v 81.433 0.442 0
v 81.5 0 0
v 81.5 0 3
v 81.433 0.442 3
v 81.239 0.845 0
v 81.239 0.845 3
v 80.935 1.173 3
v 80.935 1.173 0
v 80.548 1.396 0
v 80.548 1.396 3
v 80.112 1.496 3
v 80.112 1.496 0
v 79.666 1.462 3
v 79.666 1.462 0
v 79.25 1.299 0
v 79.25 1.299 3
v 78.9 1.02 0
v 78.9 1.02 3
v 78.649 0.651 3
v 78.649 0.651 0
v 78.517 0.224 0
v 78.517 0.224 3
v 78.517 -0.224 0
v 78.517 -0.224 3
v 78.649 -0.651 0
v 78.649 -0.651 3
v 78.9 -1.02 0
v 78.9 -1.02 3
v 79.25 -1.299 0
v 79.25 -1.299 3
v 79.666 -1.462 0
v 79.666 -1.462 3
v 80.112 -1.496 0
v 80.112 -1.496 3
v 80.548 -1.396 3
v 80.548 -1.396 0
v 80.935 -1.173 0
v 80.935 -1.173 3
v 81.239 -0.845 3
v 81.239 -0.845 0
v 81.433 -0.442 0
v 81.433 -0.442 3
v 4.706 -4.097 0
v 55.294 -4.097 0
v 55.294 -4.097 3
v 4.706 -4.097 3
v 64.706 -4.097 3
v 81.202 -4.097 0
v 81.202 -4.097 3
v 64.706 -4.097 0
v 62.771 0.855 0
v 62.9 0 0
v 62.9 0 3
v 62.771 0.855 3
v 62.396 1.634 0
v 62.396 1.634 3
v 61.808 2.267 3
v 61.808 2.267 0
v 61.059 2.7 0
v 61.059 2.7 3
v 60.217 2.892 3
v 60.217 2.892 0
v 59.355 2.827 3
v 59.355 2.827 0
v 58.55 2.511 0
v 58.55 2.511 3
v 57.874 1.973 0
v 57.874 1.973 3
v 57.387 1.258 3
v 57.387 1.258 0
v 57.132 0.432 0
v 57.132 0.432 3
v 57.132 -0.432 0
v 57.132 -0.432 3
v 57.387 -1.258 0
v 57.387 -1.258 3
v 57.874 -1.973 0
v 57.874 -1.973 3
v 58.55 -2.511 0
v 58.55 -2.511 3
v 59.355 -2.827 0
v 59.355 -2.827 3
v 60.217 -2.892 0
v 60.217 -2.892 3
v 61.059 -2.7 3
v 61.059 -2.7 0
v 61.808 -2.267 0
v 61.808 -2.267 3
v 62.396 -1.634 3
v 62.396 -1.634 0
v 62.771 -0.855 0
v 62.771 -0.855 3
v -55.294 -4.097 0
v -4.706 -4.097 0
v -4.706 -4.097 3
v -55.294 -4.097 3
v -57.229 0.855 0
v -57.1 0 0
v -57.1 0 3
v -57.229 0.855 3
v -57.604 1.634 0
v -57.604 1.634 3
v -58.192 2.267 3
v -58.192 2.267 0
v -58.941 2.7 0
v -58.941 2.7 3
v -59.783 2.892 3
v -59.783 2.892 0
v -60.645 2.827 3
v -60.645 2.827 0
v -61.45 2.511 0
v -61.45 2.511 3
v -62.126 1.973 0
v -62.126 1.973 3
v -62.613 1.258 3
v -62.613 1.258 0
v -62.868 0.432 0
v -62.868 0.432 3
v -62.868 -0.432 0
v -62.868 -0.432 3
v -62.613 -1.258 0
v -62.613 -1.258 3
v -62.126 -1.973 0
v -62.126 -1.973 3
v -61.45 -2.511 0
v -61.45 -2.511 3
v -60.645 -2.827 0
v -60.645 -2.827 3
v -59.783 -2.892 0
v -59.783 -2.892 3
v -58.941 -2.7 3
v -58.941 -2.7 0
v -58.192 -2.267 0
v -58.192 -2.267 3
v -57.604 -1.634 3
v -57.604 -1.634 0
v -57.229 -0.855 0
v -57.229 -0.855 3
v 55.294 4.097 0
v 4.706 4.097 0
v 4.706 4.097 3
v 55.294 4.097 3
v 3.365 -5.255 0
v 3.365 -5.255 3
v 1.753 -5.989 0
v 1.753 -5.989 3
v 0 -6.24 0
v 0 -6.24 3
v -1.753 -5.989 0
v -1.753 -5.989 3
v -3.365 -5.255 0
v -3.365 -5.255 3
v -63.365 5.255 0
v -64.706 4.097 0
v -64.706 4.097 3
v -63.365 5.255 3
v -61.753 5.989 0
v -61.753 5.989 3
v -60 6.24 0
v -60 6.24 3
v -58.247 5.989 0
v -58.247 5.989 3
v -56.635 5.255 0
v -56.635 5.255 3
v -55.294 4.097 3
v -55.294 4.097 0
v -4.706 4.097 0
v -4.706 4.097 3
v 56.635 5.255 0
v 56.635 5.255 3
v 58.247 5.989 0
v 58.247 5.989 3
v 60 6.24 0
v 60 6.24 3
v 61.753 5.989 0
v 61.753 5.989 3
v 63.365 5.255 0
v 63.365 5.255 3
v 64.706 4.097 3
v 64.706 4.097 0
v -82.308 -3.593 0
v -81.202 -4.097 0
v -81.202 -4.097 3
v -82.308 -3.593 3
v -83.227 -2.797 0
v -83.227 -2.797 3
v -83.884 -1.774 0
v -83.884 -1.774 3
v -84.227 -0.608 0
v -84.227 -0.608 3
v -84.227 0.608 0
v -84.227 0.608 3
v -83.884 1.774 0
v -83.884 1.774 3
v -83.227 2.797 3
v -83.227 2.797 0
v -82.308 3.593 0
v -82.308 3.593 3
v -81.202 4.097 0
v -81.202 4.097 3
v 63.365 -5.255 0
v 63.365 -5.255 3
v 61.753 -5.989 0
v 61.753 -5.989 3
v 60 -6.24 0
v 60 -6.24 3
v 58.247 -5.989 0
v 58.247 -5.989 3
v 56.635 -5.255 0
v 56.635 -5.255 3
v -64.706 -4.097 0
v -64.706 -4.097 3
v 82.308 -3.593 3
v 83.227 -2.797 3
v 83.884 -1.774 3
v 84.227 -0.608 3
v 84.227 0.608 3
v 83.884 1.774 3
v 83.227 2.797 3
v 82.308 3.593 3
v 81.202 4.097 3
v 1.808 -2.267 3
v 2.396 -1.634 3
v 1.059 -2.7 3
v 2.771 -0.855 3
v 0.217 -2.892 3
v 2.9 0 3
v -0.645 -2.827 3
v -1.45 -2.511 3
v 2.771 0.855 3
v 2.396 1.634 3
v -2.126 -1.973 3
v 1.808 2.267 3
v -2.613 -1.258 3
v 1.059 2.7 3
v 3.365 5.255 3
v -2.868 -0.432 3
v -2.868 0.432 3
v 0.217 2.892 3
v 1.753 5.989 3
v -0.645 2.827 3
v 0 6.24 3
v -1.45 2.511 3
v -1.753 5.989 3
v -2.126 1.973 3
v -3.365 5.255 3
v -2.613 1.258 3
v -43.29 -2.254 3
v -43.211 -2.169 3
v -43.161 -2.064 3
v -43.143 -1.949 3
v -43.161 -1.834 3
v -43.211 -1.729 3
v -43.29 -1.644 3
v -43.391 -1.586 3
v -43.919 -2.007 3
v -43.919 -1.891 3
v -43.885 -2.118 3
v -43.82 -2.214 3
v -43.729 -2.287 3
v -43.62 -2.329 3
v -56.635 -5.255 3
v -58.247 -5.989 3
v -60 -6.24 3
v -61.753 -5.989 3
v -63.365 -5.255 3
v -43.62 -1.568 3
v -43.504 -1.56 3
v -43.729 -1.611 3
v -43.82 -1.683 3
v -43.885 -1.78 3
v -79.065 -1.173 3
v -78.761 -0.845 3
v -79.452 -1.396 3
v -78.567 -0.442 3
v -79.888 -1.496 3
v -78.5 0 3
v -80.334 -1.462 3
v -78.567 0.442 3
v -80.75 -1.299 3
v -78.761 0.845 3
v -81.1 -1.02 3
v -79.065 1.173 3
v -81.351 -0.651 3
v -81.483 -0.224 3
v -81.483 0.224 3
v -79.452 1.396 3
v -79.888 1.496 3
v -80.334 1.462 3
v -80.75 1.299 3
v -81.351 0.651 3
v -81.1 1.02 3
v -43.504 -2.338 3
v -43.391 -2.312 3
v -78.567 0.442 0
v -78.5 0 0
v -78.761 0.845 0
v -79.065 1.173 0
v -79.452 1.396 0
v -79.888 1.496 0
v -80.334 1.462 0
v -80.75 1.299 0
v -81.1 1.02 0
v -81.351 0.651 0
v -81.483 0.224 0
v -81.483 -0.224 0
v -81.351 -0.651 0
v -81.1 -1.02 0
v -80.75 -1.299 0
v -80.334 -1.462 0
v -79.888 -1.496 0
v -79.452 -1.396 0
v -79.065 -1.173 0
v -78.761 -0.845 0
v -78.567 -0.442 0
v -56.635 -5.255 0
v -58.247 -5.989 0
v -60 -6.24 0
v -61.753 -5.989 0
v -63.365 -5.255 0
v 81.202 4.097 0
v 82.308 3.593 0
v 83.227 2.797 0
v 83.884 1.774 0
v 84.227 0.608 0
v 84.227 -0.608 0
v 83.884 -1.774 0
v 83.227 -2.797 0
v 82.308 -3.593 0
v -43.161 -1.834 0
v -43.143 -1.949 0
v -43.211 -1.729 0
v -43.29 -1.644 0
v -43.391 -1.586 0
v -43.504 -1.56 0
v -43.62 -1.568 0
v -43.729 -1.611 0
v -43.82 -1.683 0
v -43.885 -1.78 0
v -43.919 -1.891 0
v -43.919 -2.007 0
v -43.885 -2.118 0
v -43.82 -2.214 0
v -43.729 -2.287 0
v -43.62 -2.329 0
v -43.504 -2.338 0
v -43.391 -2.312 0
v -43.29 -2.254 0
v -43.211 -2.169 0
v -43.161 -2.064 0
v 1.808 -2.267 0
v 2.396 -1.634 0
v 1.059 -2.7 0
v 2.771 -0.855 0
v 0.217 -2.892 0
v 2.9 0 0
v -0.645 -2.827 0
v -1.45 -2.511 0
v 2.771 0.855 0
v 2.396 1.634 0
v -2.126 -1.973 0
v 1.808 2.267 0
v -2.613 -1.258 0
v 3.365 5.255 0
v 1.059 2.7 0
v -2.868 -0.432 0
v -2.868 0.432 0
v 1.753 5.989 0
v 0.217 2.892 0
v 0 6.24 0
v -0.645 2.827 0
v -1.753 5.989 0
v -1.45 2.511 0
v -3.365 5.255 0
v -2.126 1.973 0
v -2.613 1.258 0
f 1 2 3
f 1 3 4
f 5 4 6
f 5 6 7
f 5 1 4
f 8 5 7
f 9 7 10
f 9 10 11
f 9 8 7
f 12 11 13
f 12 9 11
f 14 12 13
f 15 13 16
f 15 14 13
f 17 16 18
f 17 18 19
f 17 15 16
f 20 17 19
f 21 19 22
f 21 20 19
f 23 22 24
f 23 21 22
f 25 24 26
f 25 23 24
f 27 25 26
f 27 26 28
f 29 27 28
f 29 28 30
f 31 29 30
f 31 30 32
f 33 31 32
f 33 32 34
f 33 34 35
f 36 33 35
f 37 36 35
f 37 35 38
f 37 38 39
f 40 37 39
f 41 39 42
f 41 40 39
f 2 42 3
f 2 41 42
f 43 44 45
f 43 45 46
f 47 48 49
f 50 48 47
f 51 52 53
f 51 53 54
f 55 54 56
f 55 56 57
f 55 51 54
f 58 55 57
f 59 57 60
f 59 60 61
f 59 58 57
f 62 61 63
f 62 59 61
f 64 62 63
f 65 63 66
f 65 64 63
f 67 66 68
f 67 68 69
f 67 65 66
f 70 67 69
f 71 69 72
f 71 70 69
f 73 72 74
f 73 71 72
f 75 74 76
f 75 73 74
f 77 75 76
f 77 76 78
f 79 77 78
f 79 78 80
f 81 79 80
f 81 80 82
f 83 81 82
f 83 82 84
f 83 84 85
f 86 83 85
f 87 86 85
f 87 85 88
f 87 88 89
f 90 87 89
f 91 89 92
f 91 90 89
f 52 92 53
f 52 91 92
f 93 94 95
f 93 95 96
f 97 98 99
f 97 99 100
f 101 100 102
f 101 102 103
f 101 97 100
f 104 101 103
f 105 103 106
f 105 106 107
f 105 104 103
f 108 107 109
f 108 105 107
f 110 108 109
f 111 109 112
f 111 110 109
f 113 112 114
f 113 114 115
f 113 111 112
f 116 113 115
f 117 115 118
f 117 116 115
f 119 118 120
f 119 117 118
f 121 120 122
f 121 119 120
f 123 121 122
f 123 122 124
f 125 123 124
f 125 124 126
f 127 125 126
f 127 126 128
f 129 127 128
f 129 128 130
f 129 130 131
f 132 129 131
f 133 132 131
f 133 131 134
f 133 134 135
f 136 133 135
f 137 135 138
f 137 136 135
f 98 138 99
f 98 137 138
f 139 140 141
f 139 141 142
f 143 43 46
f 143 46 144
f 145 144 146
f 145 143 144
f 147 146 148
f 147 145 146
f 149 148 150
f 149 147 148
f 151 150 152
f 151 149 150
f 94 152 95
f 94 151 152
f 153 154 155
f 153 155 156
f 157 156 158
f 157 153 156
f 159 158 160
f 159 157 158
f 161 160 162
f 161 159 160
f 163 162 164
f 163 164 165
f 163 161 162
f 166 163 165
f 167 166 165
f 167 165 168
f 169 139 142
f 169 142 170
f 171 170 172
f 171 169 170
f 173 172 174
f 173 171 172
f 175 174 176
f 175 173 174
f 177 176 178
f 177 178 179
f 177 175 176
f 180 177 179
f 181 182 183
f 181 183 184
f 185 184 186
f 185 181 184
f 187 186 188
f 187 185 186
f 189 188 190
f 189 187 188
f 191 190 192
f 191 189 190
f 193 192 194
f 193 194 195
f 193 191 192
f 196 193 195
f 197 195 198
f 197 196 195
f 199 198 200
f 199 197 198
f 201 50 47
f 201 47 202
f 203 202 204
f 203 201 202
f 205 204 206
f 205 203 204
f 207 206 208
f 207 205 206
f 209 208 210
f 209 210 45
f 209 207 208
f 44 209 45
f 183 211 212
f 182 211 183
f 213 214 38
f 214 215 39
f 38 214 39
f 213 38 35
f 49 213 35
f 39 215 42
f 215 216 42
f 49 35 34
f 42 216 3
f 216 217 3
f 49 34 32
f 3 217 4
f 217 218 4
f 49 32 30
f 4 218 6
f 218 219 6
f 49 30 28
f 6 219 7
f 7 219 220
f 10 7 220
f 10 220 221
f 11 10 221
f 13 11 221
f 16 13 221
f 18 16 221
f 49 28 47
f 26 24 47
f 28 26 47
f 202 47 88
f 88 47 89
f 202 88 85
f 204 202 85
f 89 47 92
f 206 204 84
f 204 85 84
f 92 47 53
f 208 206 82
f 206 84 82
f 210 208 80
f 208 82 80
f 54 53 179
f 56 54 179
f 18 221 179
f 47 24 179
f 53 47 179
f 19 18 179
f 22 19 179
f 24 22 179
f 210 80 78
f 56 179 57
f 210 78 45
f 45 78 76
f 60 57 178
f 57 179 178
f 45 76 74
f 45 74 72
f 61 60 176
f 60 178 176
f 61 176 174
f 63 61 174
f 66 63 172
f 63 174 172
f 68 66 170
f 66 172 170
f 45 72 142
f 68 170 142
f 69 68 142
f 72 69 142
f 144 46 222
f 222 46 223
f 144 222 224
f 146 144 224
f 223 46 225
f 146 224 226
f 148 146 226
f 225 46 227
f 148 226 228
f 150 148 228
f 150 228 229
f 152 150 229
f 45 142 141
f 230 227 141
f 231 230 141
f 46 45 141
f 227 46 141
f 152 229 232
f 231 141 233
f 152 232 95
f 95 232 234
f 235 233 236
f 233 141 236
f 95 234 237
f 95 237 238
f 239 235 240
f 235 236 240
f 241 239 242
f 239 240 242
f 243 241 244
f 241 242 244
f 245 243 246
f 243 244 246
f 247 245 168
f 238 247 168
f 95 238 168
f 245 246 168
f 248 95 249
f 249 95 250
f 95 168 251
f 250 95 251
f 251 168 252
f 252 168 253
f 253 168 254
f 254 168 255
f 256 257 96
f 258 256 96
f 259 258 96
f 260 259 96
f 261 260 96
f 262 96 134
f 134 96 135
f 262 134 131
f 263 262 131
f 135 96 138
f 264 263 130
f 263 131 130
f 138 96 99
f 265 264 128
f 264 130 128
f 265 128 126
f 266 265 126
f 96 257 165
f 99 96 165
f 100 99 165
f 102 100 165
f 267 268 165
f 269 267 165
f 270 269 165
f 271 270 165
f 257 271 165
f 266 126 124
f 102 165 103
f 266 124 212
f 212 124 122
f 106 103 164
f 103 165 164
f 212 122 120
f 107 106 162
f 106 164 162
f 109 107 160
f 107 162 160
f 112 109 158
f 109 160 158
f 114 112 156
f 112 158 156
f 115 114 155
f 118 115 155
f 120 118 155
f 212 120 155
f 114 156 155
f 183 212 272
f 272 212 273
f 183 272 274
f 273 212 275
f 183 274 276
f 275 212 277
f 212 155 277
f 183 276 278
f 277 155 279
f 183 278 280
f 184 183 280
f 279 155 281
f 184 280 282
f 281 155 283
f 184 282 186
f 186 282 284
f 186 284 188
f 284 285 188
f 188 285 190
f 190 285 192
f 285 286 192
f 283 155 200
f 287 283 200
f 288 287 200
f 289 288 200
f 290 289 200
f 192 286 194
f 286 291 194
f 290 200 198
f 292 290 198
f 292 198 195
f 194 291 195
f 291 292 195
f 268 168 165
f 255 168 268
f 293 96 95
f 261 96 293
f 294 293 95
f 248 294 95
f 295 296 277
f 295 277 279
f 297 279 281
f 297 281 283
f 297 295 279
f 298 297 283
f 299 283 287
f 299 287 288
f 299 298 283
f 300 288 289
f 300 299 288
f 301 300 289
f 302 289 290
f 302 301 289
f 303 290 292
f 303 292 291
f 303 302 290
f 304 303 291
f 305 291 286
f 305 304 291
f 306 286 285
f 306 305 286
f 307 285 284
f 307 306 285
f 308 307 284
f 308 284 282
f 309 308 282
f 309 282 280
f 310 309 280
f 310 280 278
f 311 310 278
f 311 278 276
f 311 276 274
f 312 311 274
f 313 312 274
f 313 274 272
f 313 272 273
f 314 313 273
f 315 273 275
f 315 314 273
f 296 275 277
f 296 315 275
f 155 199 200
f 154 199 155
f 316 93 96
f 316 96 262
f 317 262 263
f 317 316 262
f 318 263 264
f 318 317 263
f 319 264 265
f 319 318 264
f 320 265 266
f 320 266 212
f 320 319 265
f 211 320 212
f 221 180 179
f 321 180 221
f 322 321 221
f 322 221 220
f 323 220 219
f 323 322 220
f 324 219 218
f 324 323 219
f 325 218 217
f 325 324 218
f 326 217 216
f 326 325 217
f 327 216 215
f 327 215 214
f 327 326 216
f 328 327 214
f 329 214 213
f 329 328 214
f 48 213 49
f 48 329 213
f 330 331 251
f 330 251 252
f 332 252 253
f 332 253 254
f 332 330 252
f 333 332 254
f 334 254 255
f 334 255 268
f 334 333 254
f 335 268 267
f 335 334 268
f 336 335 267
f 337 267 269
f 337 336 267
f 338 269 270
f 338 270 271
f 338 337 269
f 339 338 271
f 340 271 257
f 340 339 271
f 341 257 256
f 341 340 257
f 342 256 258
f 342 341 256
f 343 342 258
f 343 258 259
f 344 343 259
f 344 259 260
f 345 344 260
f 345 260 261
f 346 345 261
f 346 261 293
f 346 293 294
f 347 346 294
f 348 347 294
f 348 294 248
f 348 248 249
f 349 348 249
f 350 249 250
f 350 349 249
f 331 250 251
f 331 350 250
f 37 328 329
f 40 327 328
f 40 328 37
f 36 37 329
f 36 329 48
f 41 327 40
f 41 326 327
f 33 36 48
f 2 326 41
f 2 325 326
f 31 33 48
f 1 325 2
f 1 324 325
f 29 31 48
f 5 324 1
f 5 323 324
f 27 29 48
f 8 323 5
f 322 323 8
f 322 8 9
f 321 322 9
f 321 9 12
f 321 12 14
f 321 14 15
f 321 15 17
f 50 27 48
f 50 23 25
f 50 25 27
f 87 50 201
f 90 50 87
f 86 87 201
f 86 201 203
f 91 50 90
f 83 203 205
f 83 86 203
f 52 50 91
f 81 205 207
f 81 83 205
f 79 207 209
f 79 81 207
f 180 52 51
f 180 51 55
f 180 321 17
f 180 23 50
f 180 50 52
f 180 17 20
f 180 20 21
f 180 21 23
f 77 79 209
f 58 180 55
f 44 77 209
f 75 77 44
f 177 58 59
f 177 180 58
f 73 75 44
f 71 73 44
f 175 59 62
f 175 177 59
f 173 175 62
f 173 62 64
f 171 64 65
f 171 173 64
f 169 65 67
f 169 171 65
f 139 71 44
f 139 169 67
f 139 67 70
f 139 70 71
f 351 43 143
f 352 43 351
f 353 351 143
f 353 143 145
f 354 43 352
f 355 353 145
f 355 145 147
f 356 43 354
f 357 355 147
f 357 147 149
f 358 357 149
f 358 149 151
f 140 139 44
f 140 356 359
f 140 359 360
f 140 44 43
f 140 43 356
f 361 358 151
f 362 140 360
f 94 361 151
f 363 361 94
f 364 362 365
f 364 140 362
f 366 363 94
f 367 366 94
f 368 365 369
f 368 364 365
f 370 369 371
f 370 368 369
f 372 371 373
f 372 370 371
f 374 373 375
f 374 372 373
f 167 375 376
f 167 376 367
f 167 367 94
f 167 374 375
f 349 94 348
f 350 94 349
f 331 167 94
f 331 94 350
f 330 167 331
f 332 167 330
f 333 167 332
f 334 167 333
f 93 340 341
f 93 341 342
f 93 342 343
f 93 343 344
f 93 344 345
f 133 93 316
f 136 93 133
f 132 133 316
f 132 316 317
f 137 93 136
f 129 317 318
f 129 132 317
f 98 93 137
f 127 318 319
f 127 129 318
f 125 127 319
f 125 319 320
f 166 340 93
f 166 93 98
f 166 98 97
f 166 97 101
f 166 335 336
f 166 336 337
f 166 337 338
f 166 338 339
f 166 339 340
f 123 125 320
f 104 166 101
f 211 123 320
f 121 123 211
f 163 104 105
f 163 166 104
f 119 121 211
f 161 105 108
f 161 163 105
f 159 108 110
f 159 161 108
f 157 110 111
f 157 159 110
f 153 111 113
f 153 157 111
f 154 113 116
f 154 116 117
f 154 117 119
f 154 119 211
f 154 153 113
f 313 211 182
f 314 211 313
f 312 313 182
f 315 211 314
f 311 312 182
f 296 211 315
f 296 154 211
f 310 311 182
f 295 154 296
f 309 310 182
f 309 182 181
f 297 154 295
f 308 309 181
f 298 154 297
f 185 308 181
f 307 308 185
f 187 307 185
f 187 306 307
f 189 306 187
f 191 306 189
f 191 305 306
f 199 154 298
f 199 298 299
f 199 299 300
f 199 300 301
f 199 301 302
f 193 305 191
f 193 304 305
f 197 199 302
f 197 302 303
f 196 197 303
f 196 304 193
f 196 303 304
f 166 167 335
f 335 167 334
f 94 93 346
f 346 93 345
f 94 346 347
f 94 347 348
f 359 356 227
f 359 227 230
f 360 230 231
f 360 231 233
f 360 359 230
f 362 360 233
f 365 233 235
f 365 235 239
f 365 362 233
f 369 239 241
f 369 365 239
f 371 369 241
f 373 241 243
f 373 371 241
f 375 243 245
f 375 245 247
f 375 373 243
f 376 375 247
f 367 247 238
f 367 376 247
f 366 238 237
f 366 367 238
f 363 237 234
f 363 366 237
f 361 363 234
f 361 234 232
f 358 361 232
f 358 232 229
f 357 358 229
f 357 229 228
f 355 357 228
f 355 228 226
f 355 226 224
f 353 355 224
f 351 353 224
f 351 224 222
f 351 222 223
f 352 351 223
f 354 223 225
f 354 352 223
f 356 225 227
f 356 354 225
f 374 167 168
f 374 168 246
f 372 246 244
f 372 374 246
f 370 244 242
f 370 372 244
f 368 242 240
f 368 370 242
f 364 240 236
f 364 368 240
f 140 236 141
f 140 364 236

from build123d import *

# Parameters (mm, degrees)
SKETCH1_R           = 2.9
SKETCH1_R_2         = 1.5
SKETCH1_R_3         = 0.390297289
BOSS_EXTRUDE1_DEPTH = 3


with BuildPart() as part:
    # Sketch1 → Boss-Extrude1 (new body)
    with BuildSketch(Plane.XY):
        with BuildLine():
            Line((-81.201730293, 4.097407022), (-64.706257079, 4.097407022))
            ThreePointArc((-64.706257079, 4.097407022), (-60, 6.24), (-55.293742921, 4.097407022))
            Line((-55.293742921, 4.097407022), (-4.706257079, 4.097407022))
            ThreePointArc((-4.706257079, 4.097407022), (0, 6.24), (4.706257079, 4.097407022))
            Line((4.706257079, 4.097407022), (55.293742921, 4.097407022))
            ThreePointArc((55.293742921, 4.097407022), (60, 6.24), (64.706257079, 4.097407022))
            Line((64.706257079, 4.097407022), (81.201730293, 4.097407022))
            ThreePointArc((81.201730293, 4.097407022), (84.27, 0), (81.201730293, -4.097407022))
            Line((81.201730293, -4.097407022), (64.706257079, -4.097407022))
            ThreePointArc((64.706257079, -4.097407022), (60, -6.24), (55.293742921, -4.097407022))
            Line((55.293742921, -4.097407022), (4.706257079, -4.097407022))
            ThreePointArc((4.706257079, -4.097407022), (0, -6.24), (-4.706257079, -4.097407022))
            Line((-4.706257079, -4.097407022), (-55.293742921, -4.097407022))
            ThreePointArc((-55.293742921, -4.097407022), (-60, -6.24), (-64.706257079, -4.097407022))
            Line((-64.706257079, -4.097407022), (-81.201730293, -4.097407022))
            ThreePointArc((-81.201730293, -4.097407022), (-84.27, 0), (-81.201730293, 4.097407022))
        make_face()
        with Locations((-60, 0)):
            Circle(SKETCH1_R, mode=Mode.SUBTRACT)
        Circle(SKETCH1_R, mode=Mode.SUBTRACT)
        with Locations((60, 0)):
            Circle(SKETCH1_R, mode=Mode.SUBTRACT)
        with Locations((80, 0)):
            Circle(SKETCH1_R_2, mode=Mode.SUBTRACT)
        with Locations((-80, 0)):
            Circle(SKETCH1_R_2, mode=Mode.SUBTRACT)
        with Locations((-43.533553558, -1.94889321)):
            Circle(SKETCH1_R_3, mode=Mode.SUBTRACT)
    extrude(amount=BOSS_EXTRUDE1_DEPTH)


solid = part.part
